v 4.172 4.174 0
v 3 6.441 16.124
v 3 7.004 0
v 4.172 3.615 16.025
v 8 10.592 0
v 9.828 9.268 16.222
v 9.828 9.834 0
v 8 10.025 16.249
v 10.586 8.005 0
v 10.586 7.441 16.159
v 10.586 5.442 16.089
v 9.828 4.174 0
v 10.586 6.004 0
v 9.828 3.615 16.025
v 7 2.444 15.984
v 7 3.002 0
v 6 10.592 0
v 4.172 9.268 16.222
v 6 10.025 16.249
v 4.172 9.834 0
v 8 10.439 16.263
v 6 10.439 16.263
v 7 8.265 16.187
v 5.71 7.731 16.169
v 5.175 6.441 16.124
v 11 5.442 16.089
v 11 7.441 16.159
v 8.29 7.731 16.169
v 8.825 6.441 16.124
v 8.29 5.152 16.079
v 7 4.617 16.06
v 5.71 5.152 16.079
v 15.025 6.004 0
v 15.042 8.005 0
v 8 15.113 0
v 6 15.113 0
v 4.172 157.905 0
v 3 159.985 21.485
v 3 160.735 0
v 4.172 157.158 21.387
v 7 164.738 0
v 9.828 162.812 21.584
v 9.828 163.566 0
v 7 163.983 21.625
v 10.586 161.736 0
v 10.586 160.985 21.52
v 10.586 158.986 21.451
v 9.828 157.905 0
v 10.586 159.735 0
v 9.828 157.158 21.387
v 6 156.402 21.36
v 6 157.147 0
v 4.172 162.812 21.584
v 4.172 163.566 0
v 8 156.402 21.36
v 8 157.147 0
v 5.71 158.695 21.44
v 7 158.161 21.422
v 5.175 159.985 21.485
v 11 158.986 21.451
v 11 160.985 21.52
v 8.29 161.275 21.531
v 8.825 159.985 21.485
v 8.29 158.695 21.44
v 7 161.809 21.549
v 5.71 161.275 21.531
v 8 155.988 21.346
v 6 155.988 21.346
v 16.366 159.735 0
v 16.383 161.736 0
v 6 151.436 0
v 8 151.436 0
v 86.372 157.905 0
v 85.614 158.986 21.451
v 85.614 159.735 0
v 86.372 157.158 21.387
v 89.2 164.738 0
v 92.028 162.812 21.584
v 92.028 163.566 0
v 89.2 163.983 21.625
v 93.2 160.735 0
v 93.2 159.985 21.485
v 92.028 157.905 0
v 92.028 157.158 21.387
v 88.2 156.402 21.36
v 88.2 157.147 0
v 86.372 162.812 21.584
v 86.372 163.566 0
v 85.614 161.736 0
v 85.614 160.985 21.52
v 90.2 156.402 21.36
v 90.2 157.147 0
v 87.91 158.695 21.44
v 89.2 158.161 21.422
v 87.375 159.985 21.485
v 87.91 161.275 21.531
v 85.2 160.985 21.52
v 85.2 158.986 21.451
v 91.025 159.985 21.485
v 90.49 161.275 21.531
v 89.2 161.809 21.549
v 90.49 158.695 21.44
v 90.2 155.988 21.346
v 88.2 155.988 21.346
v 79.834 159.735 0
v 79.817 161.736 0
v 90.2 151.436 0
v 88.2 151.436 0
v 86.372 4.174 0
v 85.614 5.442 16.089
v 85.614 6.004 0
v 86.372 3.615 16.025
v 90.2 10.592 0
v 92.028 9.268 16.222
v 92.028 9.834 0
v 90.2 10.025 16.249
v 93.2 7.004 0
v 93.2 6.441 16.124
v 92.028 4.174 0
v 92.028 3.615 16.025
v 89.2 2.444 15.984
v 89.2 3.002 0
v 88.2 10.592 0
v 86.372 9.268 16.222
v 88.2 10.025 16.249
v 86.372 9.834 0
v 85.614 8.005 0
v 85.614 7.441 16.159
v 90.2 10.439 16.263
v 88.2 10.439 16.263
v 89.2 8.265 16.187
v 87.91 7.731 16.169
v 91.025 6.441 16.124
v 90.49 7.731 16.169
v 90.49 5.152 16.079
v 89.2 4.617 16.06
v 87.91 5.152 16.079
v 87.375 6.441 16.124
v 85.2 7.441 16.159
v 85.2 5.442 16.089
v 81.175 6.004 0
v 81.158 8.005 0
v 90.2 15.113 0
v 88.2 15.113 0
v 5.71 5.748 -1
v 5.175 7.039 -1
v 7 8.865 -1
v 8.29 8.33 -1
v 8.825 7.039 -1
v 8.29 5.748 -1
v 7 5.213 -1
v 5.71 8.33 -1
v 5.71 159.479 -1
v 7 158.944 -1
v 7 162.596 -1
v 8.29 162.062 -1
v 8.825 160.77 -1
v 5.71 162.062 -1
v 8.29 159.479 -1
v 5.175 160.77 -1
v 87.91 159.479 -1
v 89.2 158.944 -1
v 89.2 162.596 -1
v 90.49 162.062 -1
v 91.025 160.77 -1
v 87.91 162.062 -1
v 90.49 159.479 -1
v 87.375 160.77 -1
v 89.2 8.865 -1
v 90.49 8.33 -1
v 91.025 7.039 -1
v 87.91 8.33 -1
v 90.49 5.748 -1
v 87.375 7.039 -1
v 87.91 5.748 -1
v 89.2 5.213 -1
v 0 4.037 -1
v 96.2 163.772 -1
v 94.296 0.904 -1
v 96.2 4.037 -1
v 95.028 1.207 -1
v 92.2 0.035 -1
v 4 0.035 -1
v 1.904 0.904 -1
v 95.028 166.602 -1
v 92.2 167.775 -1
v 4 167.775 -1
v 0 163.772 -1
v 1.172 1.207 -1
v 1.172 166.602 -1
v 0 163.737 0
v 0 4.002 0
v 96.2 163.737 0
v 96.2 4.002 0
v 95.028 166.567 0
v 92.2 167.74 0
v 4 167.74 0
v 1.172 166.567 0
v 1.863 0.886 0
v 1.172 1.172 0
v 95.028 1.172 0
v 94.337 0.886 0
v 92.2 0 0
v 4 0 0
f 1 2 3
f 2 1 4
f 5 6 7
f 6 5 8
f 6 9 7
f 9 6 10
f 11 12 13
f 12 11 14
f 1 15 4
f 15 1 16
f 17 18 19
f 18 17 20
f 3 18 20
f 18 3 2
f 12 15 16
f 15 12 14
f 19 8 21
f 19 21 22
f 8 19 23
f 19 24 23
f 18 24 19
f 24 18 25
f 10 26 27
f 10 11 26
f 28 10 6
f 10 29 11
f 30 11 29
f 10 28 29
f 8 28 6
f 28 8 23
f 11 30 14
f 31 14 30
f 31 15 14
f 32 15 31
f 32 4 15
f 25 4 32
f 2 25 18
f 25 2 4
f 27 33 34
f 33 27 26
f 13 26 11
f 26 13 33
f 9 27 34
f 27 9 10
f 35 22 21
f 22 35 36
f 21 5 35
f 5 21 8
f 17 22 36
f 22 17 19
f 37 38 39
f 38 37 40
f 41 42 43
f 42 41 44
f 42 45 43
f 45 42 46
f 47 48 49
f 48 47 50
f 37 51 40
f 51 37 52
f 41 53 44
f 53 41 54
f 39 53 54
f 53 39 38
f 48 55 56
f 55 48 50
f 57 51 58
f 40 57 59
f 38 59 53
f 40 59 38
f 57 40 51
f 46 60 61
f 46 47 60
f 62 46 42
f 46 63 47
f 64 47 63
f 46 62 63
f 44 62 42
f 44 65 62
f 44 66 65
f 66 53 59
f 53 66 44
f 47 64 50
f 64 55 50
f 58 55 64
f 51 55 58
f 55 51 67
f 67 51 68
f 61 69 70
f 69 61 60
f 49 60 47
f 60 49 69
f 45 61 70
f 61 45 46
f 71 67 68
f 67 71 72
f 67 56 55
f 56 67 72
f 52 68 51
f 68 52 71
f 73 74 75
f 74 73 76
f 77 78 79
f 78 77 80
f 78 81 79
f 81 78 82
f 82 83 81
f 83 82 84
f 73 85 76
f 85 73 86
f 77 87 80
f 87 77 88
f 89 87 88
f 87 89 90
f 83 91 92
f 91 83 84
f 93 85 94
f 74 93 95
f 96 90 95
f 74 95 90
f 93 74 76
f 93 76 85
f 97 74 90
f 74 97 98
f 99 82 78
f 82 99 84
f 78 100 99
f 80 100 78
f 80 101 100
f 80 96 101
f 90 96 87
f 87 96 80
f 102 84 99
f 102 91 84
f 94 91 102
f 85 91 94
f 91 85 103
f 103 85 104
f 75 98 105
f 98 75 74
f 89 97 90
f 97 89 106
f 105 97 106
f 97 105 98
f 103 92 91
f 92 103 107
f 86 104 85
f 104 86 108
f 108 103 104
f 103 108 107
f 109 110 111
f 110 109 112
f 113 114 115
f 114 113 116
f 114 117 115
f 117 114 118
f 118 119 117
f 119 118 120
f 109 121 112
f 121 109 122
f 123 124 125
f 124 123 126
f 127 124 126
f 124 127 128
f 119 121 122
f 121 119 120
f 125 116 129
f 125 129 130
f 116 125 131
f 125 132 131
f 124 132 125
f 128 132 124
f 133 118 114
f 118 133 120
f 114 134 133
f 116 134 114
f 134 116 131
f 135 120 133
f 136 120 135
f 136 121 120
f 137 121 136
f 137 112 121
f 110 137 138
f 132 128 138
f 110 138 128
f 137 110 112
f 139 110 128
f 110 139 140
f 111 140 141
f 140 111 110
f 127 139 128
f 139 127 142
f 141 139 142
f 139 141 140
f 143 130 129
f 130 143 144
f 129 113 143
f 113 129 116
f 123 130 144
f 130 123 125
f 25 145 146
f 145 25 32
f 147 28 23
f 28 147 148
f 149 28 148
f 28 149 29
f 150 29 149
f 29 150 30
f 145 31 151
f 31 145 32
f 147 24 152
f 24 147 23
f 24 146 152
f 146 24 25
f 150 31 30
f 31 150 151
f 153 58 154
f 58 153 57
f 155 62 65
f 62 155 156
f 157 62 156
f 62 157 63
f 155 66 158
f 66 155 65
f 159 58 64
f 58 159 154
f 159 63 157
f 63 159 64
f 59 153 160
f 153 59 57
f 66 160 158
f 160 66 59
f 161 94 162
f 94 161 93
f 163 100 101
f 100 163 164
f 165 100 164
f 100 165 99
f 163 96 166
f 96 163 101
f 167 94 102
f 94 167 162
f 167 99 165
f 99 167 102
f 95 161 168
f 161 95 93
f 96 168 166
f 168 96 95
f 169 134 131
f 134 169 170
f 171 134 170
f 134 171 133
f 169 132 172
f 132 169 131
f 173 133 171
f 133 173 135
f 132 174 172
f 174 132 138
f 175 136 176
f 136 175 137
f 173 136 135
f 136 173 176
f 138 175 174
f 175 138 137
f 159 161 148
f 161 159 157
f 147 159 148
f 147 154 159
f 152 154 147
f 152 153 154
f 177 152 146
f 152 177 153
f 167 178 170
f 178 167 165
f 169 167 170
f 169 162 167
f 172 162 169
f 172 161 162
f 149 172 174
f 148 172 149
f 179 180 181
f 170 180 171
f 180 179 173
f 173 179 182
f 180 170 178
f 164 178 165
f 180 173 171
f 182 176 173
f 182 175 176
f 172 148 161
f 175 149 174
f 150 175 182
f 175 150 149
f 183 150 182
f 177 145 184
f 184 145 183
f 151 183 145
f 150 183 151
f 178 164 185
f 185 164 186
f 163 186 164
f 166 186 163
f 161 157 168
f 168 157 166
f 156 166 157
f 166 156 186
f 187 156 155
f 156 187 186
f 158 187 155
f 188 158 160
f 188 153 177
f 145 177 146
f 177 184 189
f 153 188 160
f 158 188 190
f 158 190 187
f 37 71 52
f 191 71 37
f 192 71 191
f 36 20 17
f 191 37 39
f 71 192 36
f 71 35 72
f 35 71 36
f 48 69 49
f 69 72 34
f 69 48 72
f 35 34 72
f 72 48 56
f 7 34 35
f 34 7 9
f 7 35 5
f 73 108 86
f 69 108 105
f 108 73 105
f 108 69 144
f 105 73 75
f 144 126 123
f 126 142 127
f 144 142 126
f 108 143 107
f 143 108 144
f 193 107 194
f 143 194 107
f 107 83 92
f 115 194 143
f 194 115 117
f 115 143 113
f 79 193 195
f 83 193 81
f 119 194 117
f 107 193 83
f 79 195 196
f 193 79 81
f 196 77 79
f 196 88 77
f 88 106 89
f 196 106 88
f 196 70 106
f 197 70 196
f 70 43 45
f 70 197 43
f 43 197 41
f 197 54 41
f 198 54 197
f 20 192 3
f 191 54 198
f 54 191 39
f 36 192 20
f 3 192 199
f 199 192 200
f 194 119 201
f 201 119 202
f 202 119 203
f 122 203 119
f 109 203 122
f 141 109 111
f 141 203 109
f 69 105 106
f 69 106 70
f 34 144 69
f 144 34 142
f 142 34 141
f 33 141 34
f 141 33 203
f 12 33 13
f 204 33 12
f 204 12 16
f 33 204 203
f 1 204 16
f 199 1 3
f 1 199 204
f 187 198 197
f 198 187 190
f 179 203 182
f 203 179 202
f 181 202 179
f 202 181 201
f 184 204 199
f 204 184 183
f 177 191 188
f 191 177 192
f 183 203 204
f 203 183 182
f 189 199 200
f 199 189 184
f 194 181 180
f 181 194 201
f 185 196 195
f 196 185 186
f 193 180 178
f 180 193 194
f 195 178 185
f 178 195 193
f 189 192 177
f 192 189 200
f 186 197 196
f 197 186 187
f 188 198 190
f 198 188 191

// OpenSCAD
// Generated by SolidPython 1.1.3 on 2024-07-24 01:34:31
$fn = 8;


difference() {
	intersection() {
		union() {
			difference() {
				rotate(a = 2.0000000000, v = [1, 0, 0]) {
					translate(v = [0, 0, 16.4445000000]) {
						translate(v = [0, 157.6375000000, 0]) {
							translate(v = [10, 0, 0]) {
								difference() {
									translate(v = [-3, 0, 0]) {
										translate(v = [0, -150.6375000000, 0]) {
											translate(v = [0, 0, -68.5555000000]) {
												union() {
													translate(v = [0, 0, 0]) {
														translate(v = [0, 0, 0]) {
															union() {
																cylinder(h = 68, r = 4.0000000000);
																rotate(a = 90, v = [1, 0, 0]) {
																	linear_extrude(center = true, height = 2) {
																		polygon(paths = [[0, 1, 2, 3]], points = [[0, 0], [0, 68], [4.0000000000, 68], [21.0000000000, 0]]);
																	}
																}
																rotate(a = 90, v = [0, 0, 1]) {
																	rotate(a = 90, v = [1, 0, 0]) {
																		linear_extrude(center = true, height = 2) {
																			polygon(paths = [[0, 1, 2, 3]], points = [[0, 0], [0, 68], [4.0000000000, 68], [21.0000000000, 0]]);
																		}
																	}
																}
															}
														}
													}
													translate(v = [0, 0, 0]) {
														translate(v = [0, 153.6375000000, 0]) {
															union() {
																cylinder(h = 68, r = 4.0000000000);
																rotate(a = 90, v = [1, 0, 0]) {
																	linear_extrude(center = true, height = 2) {
																		polygon(paths = [[0, 1, 2, 3]], points = [[0, 0], [0, 68], [4.0000000000, 68], [21.0000000000, 0]]);
																	}
																}
																rotate(a = 270, v = [0, 0, 1]) {
																	rotate(a = 90, v = [1, 0, 0]) {
																		linear_extrude(center = true, height = 2) {
																			polygon(paths = [[0, 1, 2, 3]], points = [[0, 0], [0, 68], [4.0000000000, 68], [21.0000000000, 0]]);
																		}
																	}
																}
															}
														}
													}
													translate(v = [82.2000000000, 0, 0]) {
														translate(v = [0, 153.6375000000, 0]) {
															union() {
																cylinder(h = 68, r = 4.0000000000);
																rotate(a = 180, v = [0, 0, 1]) {
																	rotate(a = 90, v = [1, 0, 0]) {
																		linear_extrude(center = true, height = 2) {
																			polygon(paths = [[0, 1, 2, 3]], points = [[0, 0], [0, 68], [4.0000000000, 68], [21.0000000000, 0]]);
																		}
																	}
																}
																rotate(a = 270, v = [0, 0, 1]) {
																	rotate(a = 90, v = [1, 0, 0]) {
																		linear_extrude(center = true, height = 2) {
																			polygon(paths = [[0, 1, 2, 3]], points = [[0, 0], [0, 68], [4.0000000000, 68], [21.0000000000, 0]]);
																		}
																	}
																}
															}
														}
													}
													translate(v = [82.2000000000, 0, 0]) {
														translate(v = [0, 0, 0]) {
															union() {
																cylinder(h = 68, r = 4.0000000000);
																rotate(a = 180, v = [0, 0, 1]) {
																	rotate(a = 90, v = [1, 0, 0]) {
																		linear_extrude(center = true, height = 2) {
																			polygon(paths = [[0, 1, 2, 3]], points = [[0, 0], [0, 68], [4.0000000000, 68], [21.0000000000, 0]]);
																		}
																	}
																}
																rotate(a = 90, v = [0, 0, 1]) {
																	rotate(a = 90, v = [1, 0, 0]) {
																		linear_extrude(center = true, height = 2) {
																			polygon(paths = [[0, 1, 2, 3]], points = [[0, 0], [0, 68], [4.0000000000, 68], [21.0000000000, 0]]);
																		}
																	}
																}
															}
														}
													}
												}
											}
										}
									}
									translate(v = [-3, 0, 0]) {
										translate(v = [0, -150.6375000000, 0]) {
											union() {
												translate(v = [0, 0, 0]) {
													translate(v = [0, 0, 0]) {
														cylinder(center = true, h = 272, r = 1.8250000000);
													}
												}
												translate(v = [0, 0, 0]) {
													translate(v = [0, 153.6375000000, 0]) {
														cylinder(center = true, h = 272, r = 1.8250000000);
													}
												}
												translate(v = [82.2000000000, 0, 0]) {
													translate(v = [0, 153.6375000000, 0]) {
														cylinder(center = true, h = 272, r = 1.8250000000);
													}
												}
												translate(v = [82.2000000000, 0, 0]) {
													translate(v = [0, 0, 0]) {
														cylinder(center = true, h = 272, r = 1.8250000000);
													}
												}
											}
										}
									}
								}
							}
						}
					}
				}
				translate(v = [0, 0, -1]) {
					translate(v = [0, 0, -100]) {
						translate(v = [0, -83.8187500000, 0]) {
							translate(v = [-48.1000000000, 0, 0]) {
								cube(size = [192.4000000000, 335.2750000000, 100]);
							}
						}
					}
				}
			}
			intersection() {
				translate(v = [0, 0, -1]) {
					translate(v = [-48.1000000000, 0, 0]) {
						translate(v = [0, -83.8187500000, 0]) {
							cube(size = [192.4000000000, 335.2750000000, 1]);
						}
					}
				}
				rotate(a = 2.0000000000, v = [1, 0, 0]) {
					translate(v = [0, 0, 16.4445000000]) {
						translate(v = [0, 157.6375000000, 0]) {
							translate(v = [10, 0, 0]) {
								translate(v = [0, 0, -34.0000000000]) {
									translate(v = [38.1000000000, 0, 0]) {
										translate(v = [0, -73.8187500000, 0]) {
											minkowski() {
												cube(center = true, size = [88.2000000000, 159.6375000000, 68]);
												cylinder(center = true, h = 0.5555000000, r = 4);
											}
										}
									}
								}
							}
						}
					}
				}
			}
		}
		translate(v = [0, 0, 16.4445000000]) {
			translate(v = [0, 157.6375000000, 0]) {
				translate(v = [10, 0, 0]) {
					translate(v = [-10.0000000000, 0, 0]) {
						translate(v = [0, -251.4562500000, 0]) {
							translate(v = [0, 0, -34.0000000000]) {
								cube(size = [96.2000000000, 335.2750000000, 136]);
							}
						}
					}
				}
			}
		}
	}
	rotate(a = 2.0000000000, v = [1, 0, 0]) {
		translate(v = [0, 0, 16.4445000000]) {
			translate(v = [0, 157.6375000000, 0]) {
				translate(v = [10, 0, 0]) {
					translate(v = [-3, 0, 0]) {
						translate(v = [0, -150.6375000000, 0]) {
							union() {
								translate(v = [0, 0, 0]) {
									translate(v = [0, 0, 0]) {
										cylinder(center = true, h = 272, r = 1.8250000000);
									}
								}
								translate(v = [0, 0, 0]) {
									translate(v = [0, 153.6375000000, 0]) {
										cylinder(center = true, h = 272, r = 1.8250000000);
									}
								}
								translate(v = [82.2000000000, 0, 0]) {
									translate(v = [0, 153.6375000000, 0]) {
										cylinder(center = true, h = 272, r = 1.8250000000);
									}
								}
								translate(v = [82.2000000000, 0, 0]) {
									translate(v = [0, 0, 0]) {
										cylinder(center = true, h = 272, r = 1.8250000000);
									}
								}
							}
						}
					}
				}
			}
		}
	}
}
/***********************************************
*********      SolidPython code:      **********
************************************************
 
#!/usr/bin/env python3

import argparse
from asyncio import subprocess
import json
# import math
import re
import logging
import os
# import os.path
import subprocess
# import time

from solid import *
from solid.utils import *

from parameters import Parameters
from keyboard import Keyboard
from cable import Cable

# Set logger level variables
console_logging_level = logging.WARN
file_logging_level = logging.DEBUG


# Get root logger and set main logger level to DEBUG
logger = logging.getLogger()
logger.setLevel(logging.DEBUG)


# Create formatters
console_formatter = logging.Formatter('%(name)s %(levelname)s: %(funcName)s: [%(lineno)d]: %(message)s')
file_formatter = logging.Formatter('%(asctime)s %(levelname)s %(name)s: %(funcName)s: [%(lineno)d]: %(message)s')

# Create console handler and set level to info
console_handler = logging.StreamHandler()
console_handler.setLevel(console_logging_level)

# Add formatter to console_handler
console_handler.setFormatter(console_formatter)

# Add console handler to logger
logger.addHandler(console_handler)

# Get file info that will be used to creat log file
script_location = Path(os.path.dirname(os.path.realpath(__file__)))
log_file_name = 'generator.log'
log_file_path = script_location / log_file_name

# Create file handler and set level to info
file_handler = logging.FileHandler(log_file_path, mode = 'w')
file_handler.setLevel(file_logging_level)

# Add formatter to file_handler
file_handler.setFormatter(file_formatter)

# Add file handler to logger
logger.addHandler(file_handler)


# Helper for parser to wnsure filename argument has to correct extension
def CheckExt(choices):
    class Act(argparse.Action):
        def __call__(self,parser,namespace,fname,option_string=None):
            ext = os.path.splitext(fname)[1][1:]
            if ext not in choices:
                option_string = '({})'.format(option_string) if option_string else ''
                parser.error("file doesn't end with one of {}{}".format(choices,option_string))
            else:
                setattr(namespace,self.dest,fname)

    return Act



def main():

    parser = argparse.ArgumentParser(description='Build custom keyboard SCAD file using keyboard layout editor format')
    parser.add_argument('-i', '--input-file', metavar = 'layout_json_file_name.json', help = 'A path to a keyboard layout editor json file', required = True, action=CheckExt({'json'}))
    # parser.add_argument('-o', '--output-folder', metavar = 'scad', help = 'A path to a folder to store the generated open scad file')
    parser.add_argument('-p', '--parameter-file', metavar = 'parameters.json', help = 'A JSON file containing paramters for the object buing made', default = None, action=CheckExt({'json'}))
    parser.add_argument('-s', '--section', metavar = 'section_num', help = 'The number of the section that should be built', type = int, default = -1)
    parser.add_argument('-a', '--all-sections', help = 'Output all the parts for all possible sections in separate files', default = False, action = 'store_true')
    parser.add_argument('-e', '--exploded', help = 'Create test file with each section shown as an exploded view', default = False, action = 'store_true')
    parser.add_argument('-f', '--fragments', metavar = 'num_fragments', help = 'The number of fragments to be used when creating curves', type = int, default = 8)
    parser.add_argument('-r', '--render', help = 'Render an STL from the generated scad file', default = False, action = 'store_true')
    parser.add_argument('--switch-type-in-filename', help = 'Add the switch type name and stabilizer type name to the filname', default = False, action = 'store_true')

    # Parse command line arguments
    args = parser.parse_args()
    logger.debug(vars(args))

    # Create Path object from input file argument
    input_file_path = Path(args.input_file)

    # Get base folder path
    base_path = input_file_path.parent

    # Get input file name onle
    file_name_only = input_file_path.name
    
    # Get layout name from file name
    layout_name = input_file_path.stem

    # Generate output scad and stl output folder paths
    output_base_folder = base_path / layout_name
    scad_folder_path = output_base_folder / 'scad'
    stl_folder_path = output_base_folder / 'stl'

    # Ensure all outpur folders exists
    if output_base_folder.is_dir() == False:
        output_base_folder.mkdir()

    if scad_folder_path.is_dir() == False:
        scad_folder_path.mkdir()

    if stl_folder_path.is_dir() == False:
        stl_folder_path.mkdir()

    logger.debug('layout_name: %s', str(layout_name))
    logger.debug('base_path: %s', str(base_path))
    logger.debug('file_name_only: %s', str(file_name_only))
    
    # define output file extensions
    scad_postfix = '.scad'
    stl_postfix  = '.stl'

    # Set fragments per circle
    FRAGMENTS = args.fragments
    logger.debug('\tFragments: %d', FRAGMENTS)

    # Pattern and Replacement strings to be used when trying to turn keyboard-layout-editor raw output into valid JSON
    json_key_pattern = '([{,])([xywha1]+):'
    json_key_replace = '\\1"\\2":'

    # Open JSON layout file
    logger.debug('Open layout file %s', input_file_path)
    try:
        # Try with utf-8 encoding specified
        f = open(input_file_path, encoding="utf-8")
    except:
        # Failed to open
        logger.info('Failed to open layout file with utf-8 encoding specified. Try opening without specifying an encoding')
        try:
            # Try opening with no encoding spcificed
            f = open(input_file_path)
        except:
            logger.error('Failed to open layout file both spefifying utf-8 andcoding and not specifying any encodeing. Exiting')
            exit(1)

    logger.debug('Read layout JSON string from file %s', input_file_path)
    try:
        keyboard_layout = f.read()
    except UnicodeDecodeError:
        logger.error('Unable to decode layout file. Please provide utf-8 encoded files')
        exit(-1)

    keyboard_layout_dict = None

    # Load keyboard layout dictionary
    logger.debug('Parse layout file JSON string')
    try:
        # Attempt to parse to provided JSON string
        keyboard_layout_dict = json.loads(keyboard_layout)
        logger.debug('Valid Json Parsed')
    except:
        # Failed to parse the JSON test.
        # This most likely means that the keybaord-layout-editor raw output was provided
        # Attempt to modify that string to make it valid JSON
        keyboard_layout = '[%s]' % (keyboard_layout)
        keyboard_layout = re.sub(json_key_pattern, json_key_replace, keyboard_layout)
        try:
            keyboard_layout_dict = json.loads(keyboard_layout)
            logger.info('Initial layout Json Invalid. Json modified and parsed')
        except:
            logger.error('Failed to parse layout json after attempt at correction.')
            raise

    logger.debug('keyboard_layout_dict: %s', str(keyboard_layout_dict))


    # Read parameter file
    parameter_dict = None
    if args.parameter_file is not None:
        # Open JSON parameter file
        logger.debug('Open parameter file %s', args.parameter_file)
        try:
            # Try with utf-8 encoding specified
            f = open(args.parameter_file, encoding="utf-8")
        except:
            # Failed to open
            logger.info('Failed to open parameter file with utf-8 encoding specified. Try opening without specifying an encoding')
            try:
                # Try opening with no encoding spcificed
                f = open(args.parameter_fil)
            except:
                logger.error('Failed to open parameter file both spefifying utf-8 andcoding and not specifying any encodeing. Exiting')
                exit(1)
        

        logger.debug('Read JSON string from parameter file %s', args.parameter_file)
        try:
             parameter_file_text = f.read()
        except UnicodeDecodeError:
            logger.error('Unable to decode parameter file. Please provide utf-8 encoded files')
            exit(-1)
       
        logger.debug('Parse parameter JSON string')
        try:
            parameter_dict = json.loads(parameter_file_text)
            logger.debug('Valid Json Parsed')
        except:
            logger.error('Failed to parse parameter JSON file.')
            raise

        logger.debug('parameter_dict: %s', str(parameter_dict))


    # Set parameters from imput file
    parameters = Parameters(parameter_dict)
    
    # Create Keyboard instance
    keyboard = Keyboard(parameters)

    # Process the keyboard layout object
    keyboard.process_keyboard_layout(keyboard_layout_dict)
    keyboard.process_custom_shapes()

    logger.debug('kerf: %f', keyboard.kerf)

    # Dictionary of SolidPython solid objects that need to be rendered to SCAD and to STL if desired
    solid_object_dict = {}

    # Create objects for each of the generated sections
    if args.all_sections == True:
        # Iterate over all sections generated and add all sections to solid_object_dict
        for section in range(keyboard.get_top_section_count()):
            # Set current section for generator
            keyboard.set_section(section)

            # Create dict for section
            solid_object_dict[section] = {}

            # Add top assembly, plate, and all assembly to section dict
            solid_object_dict[section]['top'] = keyboard.get_assembly(top = True)
            solid_object_dict[section]['all'] = keyboard.get_assembly(all = True)
            solid_object_dict[section]['plate'] = keyboard.get_assembly(plate_only = True)

            # If there is a bottom section for the current section add it to section dict
            if section < keyboard.get_bottom_section_count():
                solid_object_dict[section]['bottom'] = keyboard.get_assembly(bottom = True)
            
    # Create exploded object
    elif args.exploded == True:
        solid_object_dict[-1] = {}
        solid_object_dict[-1]['top'] = union()
        solid_object_dict[-1]['plate'] = union()
        solid_object_dict[-1]['bottom'] = union()
        for section in range(keyboard.get_top_section_count()):
            keyboard.set_section(section)
            solid_object_dict[-1]['top'] += up(5 * section) ( right(10 * section) ( keyboard.get_assembly(top = True) ) )
            solid_object_dict[-1]['plate'] += up(5 * section) ( right(10 * section) ( keyboard.get_assembly(plate_only = True) ) )
            if section < keyboard.get_bottom_section_count():
                solid_object_dict[-1]['bottom'] += up(5 * section) ( right(10 * section) ( keyboard.get_assembly(bottom = True) ) )
    

    # Create objects for a specified section
    elif args.section > -1:
        # Set desired section to create
        keyboard.set_section(args.section)

        # Create dict for section
        solid_object_dict[args.section] = {}

        # Add top assembly, plate, and all assembly to section dict
        solid_object_dict[args.section]['top'] = keyboard.get_assembly(top = True)
        solid_object_dict[args.section]['all'] = keyboard.get_assembly(all = True)
        solid_object_dict[args.section]['plate'] = keyboard.get_assembly(plate_only = True)

        # If there is a bottom section for the current section add it to section dict
        if args.section < keyboard.get_bottom_section_count():
            solid_object_dict[args.section]['bottom'] = keyboard.get_assembly(bottom = True)

    # Create an objects that are not split into sections. No other options were specified
    else:
        logger.debug('Create whole object. No other options specified')
        solid_object_dict['all'] = {}
        solid_object_dict['all']['top'] = keyboard.get_assembly(top = True)
        solid_object_dict['all']['bottom'] = keyboard.get_assembly(bottom = True)
        solid_object_dict['all']['all'] = keyboard.get_assembly(all = True)
        solid_object_dict['all']['plate'] = keyboard.get_assembly(plate_only = True)
    
    # Add global items that are not dependant on the sctions or parts of the item to build
    solid_object_dict['global'] = {}

    # Generate a strain relief piece for the cable hole
    if parameters.cable_hole == True:
        cable = Cable(parameters)
        solid_object_dict['global']['cable_holder_main'] = cable.holder_main()
        solid_object_dict['global']['cable_holder_clamp'] = cable.holder_clamp()
        solid_object_dict['global']['cable_holder_all'] = cable.holder_all()

    print(parameters)
    print('Case Height: %f, Case Width: %f\n' % (parameters.real_case_height, parameters.real_case_width))
    
    logger.info('Case Height: %f, Case Width: %f', parameters.real_case_height, parameters.real_case_width)
    logger.info('Sections In Top: %d', keyboard.get_top_section_count())
    logger.info('Sections In Bottom: %d', keyboard.get_bottom_section_count())


    ############################################################
    # Render SCAD and STL files
    ############################################################
    subprocess_dict = {}

    switch_type_for_filename = ''
    stab_type_for_filename = ''

    for section in solid_object_dict.keys():

        if args.switch_type_in_filename == True:
            switch_type_for_filename = '_' + parameters.switch_type
            stab_type_for_filename = '_' + parameters.stabilizer_type

        section_postfix = ''

        # Creating global items that have no relaton to switch type
        if isinstance(section, str) and section == 'global':
            switch_type_for_filename = ''
            stab_type_for_filename = ''
        
        # If the current object dict section is an int greater than -1 add the section number to the filename
        if isinstance(section, int) and section > -1:
            section_postfix = '_section_%d' % (section)
        
        if args.exploded == True:
            section_postfix = '_exploded'

        for part_name in solid_object_dict[section].keys():
            part_name_formatted = '_' + part_name

            scad_file_name = scad_folder_path / (layout_name + section_postfix + part_name_formatted + switch_type_for_filename + stab_type_for_filename + scad_postfix)
            stl_file_name = stl_folder_path / (layout_name + section_postfix + part_name_formatted + switch_type_for_filename + stab_type_for_filename + stl_postfix)

            if solid_object_dict[section][part_name] is not None:
                logger.info('Generate scad file with name %s', scad_file_name)
                # Generate SCAD file from assembly
                scad_render_to_file(solid_object_dict[section][part_name], scad_file_name, file_header=f'$fn = {FRAGMENTS};')
                print('Generated scad file with name', scad_file_name)
                
                # Render STL if option is chosen
                if args.render:
                    logger.debug('Render STL from SCAD')
                    logger.info('Generate stl file with name %s from %s', stl_file_name, scad_file_name)

                    openscad_command_list = ['openscad', '-o', '%s' % (stl_file_name), '%s' % (scad_file_name)]
                    subprocess_dict[stl_file_name] = subprocess.Popen(openscad_command_list)
    
    
    ################################################################
    #  Wait for render processes to complete
    ################################################################
    if args.render:
        logger.debug(subprocess_dict)
        running = True
        while running == True:
            running = False
            for stl_file_name in subprocess_dict.keys():
                p = subprocess_dict[stl_file_name]
                if p is not None:
                    # running = True
                    rcode = None
                    try:
                        rcode = p.wait(.1)
                    except subprocess.TimeoutExpired as err:
                        running = True
                    if rcode is not None:
                        logger.info('Render Complete: file: %s', stl_file_name)
                        print('Render Complete: file:', stl_file_name)
                        subprocess_dict[stl_file_name] = None
            # time.sleep(1)



    logger.info('Generation Complete')

if __name__ == "__main__":
    main()
 
 
************************************************/
